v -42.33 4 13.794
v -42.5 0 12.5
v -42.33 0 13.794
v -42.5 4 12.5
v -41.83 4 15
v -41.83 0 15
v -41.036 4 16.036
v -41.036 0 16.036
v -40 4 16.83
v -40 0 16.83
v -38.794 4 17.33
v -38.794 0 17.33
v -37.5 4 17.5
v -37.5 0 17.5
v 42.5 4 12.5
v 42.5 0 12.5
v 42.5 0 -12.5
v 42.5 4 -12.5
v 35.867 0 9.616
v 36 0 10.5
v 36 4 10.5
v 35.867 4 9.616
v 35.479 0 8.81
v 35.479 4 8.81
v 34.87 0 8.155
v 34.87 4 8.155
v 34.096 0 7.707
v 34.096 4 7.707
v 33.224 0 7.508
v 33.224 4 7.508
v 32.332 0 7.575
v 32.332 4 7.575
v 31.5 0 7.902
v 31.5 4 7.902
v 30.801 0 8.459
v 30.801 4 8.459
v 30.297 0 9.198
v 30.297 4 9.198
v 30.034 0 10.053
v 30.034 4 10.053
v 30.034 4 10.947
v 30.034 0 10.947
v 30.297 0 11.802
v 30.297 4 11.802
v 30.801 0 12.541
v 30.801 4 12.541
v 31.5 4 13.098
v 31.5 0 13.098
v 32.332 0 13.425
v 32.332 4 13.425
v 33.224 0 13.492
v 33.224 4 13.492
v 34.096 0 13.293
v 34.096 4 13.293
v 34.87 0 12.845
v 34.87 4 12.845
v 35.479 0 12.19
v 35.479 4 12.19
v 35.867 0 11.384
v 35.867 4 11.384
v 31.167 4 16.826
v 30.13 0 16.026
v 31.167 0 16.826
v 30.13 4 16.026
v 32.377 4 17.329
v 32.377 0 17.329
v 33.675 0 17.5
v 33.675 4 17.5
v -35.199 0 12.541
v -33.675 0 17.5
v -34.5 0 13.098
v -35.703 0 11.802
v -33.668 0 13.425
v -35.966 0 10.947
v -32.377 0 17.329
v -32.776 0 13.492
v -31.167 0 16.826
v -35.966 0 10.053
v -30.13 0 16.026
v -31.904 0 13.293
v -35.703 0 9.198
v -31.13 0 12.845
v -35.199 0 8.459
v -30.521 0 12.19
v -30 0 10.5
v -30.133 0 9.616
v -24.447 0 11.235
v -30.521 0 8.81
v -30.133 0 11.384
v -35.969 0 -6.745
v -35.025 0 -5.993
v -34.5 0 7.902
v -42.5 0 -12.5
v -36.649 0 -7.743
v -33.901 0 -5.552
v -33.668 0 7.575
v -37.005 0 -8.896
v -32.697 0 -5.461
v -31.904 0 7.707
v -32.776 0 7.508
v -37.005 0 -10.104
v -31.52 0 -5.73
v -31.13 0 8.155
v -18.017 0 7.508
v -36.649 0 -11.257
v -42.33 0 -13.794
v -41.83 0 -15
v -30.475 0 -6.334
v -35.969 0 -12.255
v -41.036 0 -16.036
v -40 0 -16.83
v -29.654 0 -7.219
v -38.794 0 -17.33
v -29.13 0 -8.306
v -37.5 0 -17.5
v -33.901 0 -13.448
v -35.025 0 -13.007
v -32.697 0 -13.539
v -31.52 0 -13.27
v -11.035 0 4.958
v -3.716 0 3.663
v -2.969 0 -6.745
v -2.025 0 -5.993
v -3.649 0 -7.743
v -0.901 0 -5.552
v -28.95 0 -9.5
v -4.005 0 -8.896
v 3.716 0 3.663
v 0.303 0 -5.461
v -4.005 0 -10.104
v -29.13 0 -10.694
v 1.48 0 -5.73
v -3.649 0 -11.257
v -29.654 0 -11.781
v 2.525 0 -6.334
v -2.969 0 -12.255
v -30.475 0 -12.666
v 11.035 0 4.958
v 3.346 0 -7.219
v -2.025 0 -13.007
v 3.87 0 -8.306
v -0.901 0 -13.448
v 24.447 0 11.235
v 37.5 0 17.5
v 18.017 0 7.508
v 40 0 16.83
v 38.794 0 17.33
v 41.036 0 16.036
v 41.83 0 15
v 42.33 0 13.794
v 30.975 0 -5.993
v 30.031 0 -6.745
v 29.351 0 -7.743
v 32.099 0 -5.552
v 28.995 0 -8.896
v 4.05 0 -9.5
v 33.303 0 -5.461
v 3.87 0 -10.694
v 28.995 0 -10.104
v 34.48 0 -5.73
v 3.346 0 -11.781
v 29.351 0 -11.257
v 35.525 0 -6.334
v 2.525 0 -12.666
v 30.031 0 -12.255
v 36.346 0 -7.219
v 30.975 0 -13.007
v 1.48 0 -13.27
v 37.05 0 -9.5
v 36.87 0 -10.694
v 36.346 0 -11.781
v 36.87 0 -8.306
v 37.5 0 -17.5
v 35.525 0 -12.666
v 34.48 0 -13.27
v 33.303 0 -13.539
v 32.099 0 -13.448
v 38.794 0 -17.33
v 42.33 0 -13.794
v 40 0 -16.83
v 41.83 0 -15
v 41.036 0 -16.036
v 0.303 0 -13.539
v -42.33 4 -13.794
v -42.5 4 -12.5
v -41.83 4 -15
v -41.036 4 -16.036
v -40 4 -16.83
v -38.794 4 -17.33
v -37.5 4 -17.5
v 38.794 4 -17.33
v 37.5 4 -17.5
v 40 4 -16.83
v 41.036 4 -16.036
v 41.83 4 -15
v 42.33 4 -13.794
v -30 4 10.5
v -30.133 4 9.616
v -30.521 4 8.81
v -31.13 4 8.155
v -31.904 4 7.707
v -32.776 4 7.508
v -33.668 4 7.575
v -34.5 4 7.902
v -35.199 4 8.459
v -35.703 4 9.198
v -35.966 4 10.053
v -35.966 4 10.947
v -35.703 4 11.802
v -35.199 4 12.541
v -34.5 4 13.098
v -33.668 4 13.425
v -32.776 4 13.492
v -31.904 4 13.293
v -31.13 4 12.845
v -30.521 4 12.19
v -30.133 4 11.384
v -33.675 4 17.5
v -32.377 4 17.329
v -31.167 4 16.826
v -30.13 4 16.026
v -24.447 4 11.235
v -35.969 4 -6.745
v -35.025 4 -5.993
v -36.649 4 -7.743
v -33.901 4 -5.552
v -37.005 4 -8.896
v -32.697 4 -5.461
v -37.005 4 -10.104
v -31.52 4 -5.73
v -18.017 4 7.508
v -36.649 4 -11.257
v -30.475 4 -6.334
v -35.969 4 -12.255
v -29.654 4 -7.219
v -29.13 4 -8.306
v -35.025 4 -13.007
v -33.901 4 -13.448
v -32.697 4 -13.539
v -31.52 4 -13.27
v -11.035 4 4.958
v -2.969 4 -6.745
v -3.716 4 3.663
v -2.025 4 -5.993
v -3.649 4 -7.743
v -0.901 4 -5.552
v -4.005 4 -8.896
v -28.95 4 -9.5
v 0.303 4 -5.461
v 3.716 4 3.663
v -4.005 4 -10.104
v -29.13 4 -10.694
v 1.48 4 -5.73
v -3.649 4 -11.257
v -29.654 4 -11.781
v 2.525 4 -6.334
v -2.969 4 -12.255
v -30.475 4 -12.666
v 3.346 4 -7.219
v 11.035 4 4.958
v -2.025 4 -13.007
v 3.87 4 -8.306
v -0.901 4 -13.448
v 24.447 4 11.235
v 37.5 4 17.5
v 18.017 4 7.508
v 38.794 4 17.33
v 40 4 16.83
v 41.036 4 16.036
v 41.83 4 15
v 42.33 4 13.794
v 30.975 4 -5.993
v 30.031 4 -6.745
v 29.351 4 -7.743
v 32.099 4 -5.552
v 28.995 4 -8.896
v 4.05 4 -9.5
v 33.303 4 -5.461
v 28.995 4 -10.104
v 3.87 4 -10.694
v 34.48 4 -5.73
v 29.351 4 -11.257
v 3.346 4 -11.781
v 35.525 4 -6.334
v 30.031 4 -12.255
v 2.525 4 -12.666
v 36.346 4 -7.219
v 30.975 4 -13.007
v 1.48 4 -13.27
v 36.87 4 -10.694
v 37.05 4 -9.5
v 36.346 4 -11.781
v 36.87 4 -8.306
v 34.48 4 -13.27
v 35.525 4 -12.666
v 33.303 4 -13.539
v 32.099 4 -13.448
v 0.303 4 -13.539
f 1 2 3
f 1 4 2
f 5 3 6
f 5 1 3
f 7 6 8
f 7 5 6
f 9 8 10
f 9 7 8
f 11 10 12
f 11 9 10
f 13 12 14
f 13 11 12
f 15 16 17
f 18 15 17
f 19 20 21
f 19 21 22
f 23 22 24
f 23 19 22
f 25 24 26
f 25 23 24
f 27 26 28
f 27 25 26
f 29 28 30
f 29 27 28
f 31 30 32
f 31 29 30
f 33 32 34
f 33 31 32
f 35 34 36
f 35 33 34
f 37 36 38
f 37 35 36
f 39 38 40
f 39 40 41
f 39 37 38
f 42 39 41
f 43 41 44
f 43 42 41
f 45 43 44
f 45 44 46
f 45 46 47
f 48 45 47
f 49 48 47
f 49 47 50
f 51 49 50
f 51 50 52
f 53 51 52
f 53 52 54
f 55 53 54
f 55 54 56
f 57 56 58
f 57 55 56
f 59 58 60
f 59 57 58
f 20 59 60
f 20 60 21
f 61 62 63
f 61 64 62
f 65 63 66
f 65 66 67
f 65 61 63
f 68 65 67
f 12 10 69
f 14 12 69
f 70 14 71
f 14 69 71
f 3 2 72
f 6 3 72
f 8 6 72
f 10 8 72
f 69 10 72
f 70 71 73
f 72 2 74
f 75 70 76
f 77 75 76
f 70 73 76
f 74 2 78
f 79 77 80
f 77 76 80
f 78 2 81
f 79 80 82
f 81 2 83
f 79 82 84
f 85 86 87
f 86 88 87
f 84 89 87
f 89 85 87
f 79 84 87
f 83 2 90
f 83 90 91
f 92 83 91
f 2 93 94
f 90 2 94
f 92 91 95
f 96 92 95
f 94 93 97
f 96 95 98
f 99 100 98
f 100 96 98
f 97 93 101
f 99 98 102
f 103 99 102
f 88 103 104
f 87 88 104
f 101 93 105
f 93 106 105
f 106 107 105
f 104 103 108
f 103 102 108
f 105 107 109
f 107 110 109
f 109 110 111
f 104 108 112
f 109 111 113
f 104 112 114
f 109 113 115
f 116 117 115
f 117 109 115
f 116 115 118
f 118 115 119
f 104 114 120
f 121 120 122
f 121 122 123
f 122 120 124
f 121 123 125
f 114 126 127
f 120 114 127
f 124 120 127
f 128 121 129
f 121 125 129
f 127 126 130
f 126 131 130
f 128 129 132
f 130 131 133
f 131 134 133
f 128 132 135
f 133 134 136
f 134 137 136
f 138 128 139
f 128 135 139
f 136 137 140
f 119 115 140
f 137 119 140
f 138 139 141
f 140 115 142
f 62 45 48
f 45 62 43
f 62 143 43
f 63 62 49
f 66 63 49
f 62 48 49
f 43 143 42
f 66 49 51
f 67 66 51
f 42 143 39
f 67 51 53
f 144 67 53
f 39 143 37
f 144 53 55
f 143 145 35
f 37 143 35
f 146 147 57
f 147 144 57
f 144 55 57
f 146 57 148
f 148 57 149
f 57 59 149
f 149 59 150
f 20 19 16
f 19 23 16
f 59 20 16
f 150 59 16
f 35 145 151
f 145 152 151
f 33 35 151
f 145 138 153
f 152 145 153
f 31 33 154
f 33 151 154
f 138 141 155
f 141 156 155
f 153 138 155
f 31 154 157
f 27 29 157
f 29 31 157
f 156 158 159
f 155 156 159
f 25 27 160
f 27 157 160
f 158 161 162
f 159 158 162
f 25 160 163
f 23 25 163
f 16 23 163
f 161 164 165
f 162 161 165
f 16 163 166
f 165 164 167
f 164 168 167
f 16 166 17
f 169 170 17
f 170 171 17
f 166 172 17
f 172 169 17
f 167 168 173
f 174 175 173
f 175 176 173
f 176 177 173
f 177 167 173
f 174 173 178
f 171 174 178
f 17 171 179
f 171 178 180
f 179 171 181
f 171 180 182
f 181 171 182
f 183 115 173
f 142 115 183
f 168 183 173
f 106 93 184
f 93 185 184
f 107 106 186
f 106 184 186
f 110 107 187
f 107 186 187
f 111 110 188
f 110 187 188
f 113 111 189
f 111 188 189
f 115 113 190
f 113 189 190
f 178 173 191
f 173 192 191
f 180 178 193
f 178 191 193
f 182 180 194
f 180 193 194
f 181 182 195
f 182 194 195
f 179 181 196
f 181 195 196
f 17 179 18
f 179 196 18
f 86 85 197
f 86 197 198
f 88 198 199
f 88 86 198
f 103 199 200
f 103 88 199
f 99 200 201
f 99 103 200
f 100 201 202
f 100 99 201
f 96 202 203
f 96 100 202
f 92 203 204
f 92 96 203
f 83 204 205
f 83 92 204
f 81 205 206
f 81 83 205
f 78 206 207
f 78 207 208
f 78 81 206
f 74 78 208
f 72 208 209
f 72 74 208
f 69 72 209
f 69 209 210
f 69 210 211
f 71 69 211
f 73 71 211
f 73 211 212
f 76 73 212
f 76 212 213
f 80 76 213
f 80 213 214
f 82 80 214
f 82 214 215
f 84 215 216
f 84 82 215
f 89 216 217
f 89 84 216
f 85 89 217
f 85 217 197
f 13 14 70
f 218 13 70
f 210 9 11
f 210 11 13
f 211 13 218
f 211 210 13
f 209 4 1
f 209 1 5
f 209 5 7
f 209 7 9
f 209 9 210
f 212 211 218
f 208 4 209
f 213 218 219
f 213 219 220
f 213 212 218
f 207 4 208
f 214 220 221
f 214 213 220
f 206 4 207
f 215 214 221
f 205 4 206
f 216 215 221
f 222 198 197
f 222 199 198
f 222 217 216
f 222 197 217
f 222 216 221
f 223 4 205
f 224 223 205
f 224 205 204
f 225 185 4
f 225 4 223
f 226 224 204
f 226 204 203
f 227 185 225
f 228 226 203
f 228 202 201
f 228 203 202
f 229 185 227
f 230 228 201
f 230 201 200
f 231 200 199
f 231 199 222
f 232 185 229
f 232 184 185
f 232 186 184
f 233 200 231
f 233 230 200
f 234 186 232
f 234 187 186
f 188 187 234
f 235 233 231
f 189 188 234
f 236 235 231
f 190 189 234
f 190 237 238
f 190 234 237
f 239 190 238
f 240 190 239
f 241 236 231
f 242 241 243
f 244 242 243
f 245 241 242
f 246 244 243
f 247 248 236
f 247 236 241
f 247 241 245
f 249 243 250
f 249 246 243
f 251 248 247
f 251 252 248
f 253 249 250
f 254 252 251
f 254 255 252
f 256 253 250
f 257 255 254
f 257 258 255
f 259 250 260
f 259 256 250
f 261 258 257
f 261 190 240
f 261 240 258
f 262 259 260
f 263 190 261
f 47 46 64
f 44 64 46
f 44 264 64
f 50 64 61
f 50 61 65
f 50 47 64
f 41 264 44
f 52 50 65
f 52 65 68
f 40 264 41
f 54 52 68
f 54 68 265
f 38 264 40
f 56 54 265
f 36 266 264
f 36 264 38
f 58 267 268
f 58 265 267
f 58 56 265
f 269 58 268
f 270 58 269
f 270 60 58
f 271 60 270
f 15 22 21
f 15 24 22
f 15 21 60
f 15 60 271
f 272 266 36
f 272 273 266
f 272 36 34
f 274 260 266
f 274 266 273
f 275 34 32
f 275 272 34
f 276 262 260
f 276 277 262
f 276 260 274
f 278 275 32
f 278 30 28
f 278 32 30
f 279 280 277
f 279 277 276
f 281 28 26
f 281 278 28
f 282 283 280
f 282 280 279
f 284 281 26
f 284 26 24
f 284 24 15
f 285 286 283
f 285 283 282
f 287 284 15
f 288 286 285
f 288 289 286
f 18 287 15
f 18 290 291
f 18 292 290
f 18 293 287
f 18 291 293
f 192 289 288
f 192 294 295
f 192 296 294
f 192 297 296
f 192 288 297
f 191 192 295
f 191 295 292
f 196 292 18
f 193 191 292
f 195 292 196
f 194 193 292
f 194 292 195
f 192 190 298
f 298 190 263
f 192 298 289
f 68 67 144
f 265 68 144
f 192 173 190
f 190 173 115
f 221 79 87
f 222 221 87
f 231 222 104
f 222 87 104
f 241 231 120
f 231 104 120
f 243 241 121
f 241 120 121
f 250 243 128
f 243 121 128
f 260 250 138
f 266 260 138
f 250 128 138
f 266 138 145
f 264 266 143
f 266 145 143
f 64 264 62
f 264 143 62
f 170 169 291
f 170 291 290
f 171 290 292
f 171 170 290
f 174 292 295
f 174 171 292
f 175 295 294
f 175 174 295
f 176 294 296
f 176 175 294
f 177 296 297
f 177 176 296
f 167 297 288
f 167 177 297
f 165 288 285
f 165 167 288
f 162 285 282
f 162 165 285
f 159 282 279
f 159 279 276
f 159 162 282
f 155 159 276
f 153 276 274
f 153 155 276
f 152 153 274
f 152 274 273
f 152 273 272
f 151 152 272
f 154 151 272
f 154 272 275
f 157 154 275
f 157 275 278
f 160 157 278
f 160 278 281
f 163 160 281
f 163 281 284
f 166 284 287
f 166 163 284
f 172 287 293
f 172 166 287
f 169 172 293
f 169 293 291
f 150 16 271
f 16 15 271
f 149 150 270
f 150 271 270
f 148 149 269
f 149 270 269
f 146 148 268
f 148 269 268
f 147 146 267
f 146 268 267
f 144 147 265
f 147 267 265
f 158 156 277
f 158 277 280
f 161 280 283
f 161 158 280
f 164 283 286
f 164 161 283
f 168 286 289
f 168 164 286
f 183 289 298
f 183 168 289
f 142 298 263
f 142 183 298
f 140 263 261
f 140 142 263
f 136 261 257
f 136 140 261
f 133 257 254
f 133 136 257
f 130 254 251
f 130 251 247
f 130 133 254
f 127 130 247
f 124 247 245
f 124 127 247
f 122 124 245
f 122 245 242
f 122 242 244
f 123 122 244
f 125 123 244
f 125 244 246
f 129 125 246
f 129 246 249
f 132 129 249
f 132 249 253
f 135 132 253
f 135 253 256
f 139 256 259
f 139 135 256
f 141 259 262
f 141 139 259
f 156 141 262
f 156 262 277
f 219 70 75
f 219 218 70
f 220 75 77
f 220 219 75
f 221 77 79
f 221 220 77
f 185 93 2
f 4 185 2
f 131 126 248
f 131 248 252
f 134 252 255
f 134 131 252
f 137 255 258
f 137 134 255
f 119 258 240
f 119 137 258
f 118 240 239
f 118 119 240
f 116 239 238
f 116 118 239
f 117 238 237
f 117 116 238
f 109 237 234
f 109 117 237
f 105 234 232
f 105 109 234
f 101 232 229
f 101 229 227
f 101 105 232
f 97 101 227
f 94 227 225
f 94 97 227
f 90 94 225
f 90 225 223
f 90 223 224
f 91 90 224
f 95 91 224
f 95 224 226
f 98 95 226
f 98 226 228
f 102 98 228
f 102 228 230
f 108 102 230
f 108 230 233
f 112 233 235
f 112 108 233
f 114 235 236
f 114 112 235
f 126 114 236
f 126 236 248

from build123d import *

# Parameters (mm, degrees)
SKETCH1_R           = 3
SKETCH1_R_2         = 4.05
BOSS_EXTRUDE1_DEPTH = 4
FILLET1_R           = 5


with BuildPart() as part:
    # Sketch1 → Boss-Extrude1 (new body)
    with BuildSketch(Plane(origin=(0, 0, 0), x_dir=(1, 0, 0), z_dir=(0, 1, 0))):
        with BuildLine():
            Line((-42.5, 17.5), (-42.5, -17.5))
            Line((-42.5, -17.5), (-31.527765541, -17.5))
            ThreePointArc((-31.527765541, -17.5), (0, -3.5), (31.527765541, -17.5))
            Line((31.527765541, -17.5), (42.5, -17.5))
            Line((42.5, -17.5), (42.5, 17.5))
            Line((42.5, 17.5), (-42.5, 17.5))
        make_face()
        with Locations((-33, -10.5)):
            Circle(SKETCH1_R, mode=Mode.SUBTRACT)
        with Locations((-33, 9.5)):
            Circle(SKETCH1_R_2, mode=Mode.SUBTRACT)
        with Locations((33, -10.5)):
            Circle(SKETCH1_R, mode=Mode.SUBTRACT)
        with Locations((0, 9.5)):
            Circle(SKETCH1_R_2, mode=Mode.SUBTRACT)
        with Locations((33, 9.5)):
            Circle(SKETCH1_R_2, mode=Mode.SUBTRACT)
    extrude(amount=BOSS_EXTRUDE1_DEPTH)

    # Fillet1
    fillet1_edges = [part.edges().sort_by_distance(p)[0] for p in [
        (-31.527765541, 2, 17.5),
        (-42.5, 2, 17.5),
        (-42.5, 2, -17.5),
        (42.5, 2, -17.5),
        (42.5, 2, 17.5),
        (31.527765541, 2, 17.5),
    ]]
    fillet(fillet1_edges, radius=FILLET1_R)


solid = part.part
